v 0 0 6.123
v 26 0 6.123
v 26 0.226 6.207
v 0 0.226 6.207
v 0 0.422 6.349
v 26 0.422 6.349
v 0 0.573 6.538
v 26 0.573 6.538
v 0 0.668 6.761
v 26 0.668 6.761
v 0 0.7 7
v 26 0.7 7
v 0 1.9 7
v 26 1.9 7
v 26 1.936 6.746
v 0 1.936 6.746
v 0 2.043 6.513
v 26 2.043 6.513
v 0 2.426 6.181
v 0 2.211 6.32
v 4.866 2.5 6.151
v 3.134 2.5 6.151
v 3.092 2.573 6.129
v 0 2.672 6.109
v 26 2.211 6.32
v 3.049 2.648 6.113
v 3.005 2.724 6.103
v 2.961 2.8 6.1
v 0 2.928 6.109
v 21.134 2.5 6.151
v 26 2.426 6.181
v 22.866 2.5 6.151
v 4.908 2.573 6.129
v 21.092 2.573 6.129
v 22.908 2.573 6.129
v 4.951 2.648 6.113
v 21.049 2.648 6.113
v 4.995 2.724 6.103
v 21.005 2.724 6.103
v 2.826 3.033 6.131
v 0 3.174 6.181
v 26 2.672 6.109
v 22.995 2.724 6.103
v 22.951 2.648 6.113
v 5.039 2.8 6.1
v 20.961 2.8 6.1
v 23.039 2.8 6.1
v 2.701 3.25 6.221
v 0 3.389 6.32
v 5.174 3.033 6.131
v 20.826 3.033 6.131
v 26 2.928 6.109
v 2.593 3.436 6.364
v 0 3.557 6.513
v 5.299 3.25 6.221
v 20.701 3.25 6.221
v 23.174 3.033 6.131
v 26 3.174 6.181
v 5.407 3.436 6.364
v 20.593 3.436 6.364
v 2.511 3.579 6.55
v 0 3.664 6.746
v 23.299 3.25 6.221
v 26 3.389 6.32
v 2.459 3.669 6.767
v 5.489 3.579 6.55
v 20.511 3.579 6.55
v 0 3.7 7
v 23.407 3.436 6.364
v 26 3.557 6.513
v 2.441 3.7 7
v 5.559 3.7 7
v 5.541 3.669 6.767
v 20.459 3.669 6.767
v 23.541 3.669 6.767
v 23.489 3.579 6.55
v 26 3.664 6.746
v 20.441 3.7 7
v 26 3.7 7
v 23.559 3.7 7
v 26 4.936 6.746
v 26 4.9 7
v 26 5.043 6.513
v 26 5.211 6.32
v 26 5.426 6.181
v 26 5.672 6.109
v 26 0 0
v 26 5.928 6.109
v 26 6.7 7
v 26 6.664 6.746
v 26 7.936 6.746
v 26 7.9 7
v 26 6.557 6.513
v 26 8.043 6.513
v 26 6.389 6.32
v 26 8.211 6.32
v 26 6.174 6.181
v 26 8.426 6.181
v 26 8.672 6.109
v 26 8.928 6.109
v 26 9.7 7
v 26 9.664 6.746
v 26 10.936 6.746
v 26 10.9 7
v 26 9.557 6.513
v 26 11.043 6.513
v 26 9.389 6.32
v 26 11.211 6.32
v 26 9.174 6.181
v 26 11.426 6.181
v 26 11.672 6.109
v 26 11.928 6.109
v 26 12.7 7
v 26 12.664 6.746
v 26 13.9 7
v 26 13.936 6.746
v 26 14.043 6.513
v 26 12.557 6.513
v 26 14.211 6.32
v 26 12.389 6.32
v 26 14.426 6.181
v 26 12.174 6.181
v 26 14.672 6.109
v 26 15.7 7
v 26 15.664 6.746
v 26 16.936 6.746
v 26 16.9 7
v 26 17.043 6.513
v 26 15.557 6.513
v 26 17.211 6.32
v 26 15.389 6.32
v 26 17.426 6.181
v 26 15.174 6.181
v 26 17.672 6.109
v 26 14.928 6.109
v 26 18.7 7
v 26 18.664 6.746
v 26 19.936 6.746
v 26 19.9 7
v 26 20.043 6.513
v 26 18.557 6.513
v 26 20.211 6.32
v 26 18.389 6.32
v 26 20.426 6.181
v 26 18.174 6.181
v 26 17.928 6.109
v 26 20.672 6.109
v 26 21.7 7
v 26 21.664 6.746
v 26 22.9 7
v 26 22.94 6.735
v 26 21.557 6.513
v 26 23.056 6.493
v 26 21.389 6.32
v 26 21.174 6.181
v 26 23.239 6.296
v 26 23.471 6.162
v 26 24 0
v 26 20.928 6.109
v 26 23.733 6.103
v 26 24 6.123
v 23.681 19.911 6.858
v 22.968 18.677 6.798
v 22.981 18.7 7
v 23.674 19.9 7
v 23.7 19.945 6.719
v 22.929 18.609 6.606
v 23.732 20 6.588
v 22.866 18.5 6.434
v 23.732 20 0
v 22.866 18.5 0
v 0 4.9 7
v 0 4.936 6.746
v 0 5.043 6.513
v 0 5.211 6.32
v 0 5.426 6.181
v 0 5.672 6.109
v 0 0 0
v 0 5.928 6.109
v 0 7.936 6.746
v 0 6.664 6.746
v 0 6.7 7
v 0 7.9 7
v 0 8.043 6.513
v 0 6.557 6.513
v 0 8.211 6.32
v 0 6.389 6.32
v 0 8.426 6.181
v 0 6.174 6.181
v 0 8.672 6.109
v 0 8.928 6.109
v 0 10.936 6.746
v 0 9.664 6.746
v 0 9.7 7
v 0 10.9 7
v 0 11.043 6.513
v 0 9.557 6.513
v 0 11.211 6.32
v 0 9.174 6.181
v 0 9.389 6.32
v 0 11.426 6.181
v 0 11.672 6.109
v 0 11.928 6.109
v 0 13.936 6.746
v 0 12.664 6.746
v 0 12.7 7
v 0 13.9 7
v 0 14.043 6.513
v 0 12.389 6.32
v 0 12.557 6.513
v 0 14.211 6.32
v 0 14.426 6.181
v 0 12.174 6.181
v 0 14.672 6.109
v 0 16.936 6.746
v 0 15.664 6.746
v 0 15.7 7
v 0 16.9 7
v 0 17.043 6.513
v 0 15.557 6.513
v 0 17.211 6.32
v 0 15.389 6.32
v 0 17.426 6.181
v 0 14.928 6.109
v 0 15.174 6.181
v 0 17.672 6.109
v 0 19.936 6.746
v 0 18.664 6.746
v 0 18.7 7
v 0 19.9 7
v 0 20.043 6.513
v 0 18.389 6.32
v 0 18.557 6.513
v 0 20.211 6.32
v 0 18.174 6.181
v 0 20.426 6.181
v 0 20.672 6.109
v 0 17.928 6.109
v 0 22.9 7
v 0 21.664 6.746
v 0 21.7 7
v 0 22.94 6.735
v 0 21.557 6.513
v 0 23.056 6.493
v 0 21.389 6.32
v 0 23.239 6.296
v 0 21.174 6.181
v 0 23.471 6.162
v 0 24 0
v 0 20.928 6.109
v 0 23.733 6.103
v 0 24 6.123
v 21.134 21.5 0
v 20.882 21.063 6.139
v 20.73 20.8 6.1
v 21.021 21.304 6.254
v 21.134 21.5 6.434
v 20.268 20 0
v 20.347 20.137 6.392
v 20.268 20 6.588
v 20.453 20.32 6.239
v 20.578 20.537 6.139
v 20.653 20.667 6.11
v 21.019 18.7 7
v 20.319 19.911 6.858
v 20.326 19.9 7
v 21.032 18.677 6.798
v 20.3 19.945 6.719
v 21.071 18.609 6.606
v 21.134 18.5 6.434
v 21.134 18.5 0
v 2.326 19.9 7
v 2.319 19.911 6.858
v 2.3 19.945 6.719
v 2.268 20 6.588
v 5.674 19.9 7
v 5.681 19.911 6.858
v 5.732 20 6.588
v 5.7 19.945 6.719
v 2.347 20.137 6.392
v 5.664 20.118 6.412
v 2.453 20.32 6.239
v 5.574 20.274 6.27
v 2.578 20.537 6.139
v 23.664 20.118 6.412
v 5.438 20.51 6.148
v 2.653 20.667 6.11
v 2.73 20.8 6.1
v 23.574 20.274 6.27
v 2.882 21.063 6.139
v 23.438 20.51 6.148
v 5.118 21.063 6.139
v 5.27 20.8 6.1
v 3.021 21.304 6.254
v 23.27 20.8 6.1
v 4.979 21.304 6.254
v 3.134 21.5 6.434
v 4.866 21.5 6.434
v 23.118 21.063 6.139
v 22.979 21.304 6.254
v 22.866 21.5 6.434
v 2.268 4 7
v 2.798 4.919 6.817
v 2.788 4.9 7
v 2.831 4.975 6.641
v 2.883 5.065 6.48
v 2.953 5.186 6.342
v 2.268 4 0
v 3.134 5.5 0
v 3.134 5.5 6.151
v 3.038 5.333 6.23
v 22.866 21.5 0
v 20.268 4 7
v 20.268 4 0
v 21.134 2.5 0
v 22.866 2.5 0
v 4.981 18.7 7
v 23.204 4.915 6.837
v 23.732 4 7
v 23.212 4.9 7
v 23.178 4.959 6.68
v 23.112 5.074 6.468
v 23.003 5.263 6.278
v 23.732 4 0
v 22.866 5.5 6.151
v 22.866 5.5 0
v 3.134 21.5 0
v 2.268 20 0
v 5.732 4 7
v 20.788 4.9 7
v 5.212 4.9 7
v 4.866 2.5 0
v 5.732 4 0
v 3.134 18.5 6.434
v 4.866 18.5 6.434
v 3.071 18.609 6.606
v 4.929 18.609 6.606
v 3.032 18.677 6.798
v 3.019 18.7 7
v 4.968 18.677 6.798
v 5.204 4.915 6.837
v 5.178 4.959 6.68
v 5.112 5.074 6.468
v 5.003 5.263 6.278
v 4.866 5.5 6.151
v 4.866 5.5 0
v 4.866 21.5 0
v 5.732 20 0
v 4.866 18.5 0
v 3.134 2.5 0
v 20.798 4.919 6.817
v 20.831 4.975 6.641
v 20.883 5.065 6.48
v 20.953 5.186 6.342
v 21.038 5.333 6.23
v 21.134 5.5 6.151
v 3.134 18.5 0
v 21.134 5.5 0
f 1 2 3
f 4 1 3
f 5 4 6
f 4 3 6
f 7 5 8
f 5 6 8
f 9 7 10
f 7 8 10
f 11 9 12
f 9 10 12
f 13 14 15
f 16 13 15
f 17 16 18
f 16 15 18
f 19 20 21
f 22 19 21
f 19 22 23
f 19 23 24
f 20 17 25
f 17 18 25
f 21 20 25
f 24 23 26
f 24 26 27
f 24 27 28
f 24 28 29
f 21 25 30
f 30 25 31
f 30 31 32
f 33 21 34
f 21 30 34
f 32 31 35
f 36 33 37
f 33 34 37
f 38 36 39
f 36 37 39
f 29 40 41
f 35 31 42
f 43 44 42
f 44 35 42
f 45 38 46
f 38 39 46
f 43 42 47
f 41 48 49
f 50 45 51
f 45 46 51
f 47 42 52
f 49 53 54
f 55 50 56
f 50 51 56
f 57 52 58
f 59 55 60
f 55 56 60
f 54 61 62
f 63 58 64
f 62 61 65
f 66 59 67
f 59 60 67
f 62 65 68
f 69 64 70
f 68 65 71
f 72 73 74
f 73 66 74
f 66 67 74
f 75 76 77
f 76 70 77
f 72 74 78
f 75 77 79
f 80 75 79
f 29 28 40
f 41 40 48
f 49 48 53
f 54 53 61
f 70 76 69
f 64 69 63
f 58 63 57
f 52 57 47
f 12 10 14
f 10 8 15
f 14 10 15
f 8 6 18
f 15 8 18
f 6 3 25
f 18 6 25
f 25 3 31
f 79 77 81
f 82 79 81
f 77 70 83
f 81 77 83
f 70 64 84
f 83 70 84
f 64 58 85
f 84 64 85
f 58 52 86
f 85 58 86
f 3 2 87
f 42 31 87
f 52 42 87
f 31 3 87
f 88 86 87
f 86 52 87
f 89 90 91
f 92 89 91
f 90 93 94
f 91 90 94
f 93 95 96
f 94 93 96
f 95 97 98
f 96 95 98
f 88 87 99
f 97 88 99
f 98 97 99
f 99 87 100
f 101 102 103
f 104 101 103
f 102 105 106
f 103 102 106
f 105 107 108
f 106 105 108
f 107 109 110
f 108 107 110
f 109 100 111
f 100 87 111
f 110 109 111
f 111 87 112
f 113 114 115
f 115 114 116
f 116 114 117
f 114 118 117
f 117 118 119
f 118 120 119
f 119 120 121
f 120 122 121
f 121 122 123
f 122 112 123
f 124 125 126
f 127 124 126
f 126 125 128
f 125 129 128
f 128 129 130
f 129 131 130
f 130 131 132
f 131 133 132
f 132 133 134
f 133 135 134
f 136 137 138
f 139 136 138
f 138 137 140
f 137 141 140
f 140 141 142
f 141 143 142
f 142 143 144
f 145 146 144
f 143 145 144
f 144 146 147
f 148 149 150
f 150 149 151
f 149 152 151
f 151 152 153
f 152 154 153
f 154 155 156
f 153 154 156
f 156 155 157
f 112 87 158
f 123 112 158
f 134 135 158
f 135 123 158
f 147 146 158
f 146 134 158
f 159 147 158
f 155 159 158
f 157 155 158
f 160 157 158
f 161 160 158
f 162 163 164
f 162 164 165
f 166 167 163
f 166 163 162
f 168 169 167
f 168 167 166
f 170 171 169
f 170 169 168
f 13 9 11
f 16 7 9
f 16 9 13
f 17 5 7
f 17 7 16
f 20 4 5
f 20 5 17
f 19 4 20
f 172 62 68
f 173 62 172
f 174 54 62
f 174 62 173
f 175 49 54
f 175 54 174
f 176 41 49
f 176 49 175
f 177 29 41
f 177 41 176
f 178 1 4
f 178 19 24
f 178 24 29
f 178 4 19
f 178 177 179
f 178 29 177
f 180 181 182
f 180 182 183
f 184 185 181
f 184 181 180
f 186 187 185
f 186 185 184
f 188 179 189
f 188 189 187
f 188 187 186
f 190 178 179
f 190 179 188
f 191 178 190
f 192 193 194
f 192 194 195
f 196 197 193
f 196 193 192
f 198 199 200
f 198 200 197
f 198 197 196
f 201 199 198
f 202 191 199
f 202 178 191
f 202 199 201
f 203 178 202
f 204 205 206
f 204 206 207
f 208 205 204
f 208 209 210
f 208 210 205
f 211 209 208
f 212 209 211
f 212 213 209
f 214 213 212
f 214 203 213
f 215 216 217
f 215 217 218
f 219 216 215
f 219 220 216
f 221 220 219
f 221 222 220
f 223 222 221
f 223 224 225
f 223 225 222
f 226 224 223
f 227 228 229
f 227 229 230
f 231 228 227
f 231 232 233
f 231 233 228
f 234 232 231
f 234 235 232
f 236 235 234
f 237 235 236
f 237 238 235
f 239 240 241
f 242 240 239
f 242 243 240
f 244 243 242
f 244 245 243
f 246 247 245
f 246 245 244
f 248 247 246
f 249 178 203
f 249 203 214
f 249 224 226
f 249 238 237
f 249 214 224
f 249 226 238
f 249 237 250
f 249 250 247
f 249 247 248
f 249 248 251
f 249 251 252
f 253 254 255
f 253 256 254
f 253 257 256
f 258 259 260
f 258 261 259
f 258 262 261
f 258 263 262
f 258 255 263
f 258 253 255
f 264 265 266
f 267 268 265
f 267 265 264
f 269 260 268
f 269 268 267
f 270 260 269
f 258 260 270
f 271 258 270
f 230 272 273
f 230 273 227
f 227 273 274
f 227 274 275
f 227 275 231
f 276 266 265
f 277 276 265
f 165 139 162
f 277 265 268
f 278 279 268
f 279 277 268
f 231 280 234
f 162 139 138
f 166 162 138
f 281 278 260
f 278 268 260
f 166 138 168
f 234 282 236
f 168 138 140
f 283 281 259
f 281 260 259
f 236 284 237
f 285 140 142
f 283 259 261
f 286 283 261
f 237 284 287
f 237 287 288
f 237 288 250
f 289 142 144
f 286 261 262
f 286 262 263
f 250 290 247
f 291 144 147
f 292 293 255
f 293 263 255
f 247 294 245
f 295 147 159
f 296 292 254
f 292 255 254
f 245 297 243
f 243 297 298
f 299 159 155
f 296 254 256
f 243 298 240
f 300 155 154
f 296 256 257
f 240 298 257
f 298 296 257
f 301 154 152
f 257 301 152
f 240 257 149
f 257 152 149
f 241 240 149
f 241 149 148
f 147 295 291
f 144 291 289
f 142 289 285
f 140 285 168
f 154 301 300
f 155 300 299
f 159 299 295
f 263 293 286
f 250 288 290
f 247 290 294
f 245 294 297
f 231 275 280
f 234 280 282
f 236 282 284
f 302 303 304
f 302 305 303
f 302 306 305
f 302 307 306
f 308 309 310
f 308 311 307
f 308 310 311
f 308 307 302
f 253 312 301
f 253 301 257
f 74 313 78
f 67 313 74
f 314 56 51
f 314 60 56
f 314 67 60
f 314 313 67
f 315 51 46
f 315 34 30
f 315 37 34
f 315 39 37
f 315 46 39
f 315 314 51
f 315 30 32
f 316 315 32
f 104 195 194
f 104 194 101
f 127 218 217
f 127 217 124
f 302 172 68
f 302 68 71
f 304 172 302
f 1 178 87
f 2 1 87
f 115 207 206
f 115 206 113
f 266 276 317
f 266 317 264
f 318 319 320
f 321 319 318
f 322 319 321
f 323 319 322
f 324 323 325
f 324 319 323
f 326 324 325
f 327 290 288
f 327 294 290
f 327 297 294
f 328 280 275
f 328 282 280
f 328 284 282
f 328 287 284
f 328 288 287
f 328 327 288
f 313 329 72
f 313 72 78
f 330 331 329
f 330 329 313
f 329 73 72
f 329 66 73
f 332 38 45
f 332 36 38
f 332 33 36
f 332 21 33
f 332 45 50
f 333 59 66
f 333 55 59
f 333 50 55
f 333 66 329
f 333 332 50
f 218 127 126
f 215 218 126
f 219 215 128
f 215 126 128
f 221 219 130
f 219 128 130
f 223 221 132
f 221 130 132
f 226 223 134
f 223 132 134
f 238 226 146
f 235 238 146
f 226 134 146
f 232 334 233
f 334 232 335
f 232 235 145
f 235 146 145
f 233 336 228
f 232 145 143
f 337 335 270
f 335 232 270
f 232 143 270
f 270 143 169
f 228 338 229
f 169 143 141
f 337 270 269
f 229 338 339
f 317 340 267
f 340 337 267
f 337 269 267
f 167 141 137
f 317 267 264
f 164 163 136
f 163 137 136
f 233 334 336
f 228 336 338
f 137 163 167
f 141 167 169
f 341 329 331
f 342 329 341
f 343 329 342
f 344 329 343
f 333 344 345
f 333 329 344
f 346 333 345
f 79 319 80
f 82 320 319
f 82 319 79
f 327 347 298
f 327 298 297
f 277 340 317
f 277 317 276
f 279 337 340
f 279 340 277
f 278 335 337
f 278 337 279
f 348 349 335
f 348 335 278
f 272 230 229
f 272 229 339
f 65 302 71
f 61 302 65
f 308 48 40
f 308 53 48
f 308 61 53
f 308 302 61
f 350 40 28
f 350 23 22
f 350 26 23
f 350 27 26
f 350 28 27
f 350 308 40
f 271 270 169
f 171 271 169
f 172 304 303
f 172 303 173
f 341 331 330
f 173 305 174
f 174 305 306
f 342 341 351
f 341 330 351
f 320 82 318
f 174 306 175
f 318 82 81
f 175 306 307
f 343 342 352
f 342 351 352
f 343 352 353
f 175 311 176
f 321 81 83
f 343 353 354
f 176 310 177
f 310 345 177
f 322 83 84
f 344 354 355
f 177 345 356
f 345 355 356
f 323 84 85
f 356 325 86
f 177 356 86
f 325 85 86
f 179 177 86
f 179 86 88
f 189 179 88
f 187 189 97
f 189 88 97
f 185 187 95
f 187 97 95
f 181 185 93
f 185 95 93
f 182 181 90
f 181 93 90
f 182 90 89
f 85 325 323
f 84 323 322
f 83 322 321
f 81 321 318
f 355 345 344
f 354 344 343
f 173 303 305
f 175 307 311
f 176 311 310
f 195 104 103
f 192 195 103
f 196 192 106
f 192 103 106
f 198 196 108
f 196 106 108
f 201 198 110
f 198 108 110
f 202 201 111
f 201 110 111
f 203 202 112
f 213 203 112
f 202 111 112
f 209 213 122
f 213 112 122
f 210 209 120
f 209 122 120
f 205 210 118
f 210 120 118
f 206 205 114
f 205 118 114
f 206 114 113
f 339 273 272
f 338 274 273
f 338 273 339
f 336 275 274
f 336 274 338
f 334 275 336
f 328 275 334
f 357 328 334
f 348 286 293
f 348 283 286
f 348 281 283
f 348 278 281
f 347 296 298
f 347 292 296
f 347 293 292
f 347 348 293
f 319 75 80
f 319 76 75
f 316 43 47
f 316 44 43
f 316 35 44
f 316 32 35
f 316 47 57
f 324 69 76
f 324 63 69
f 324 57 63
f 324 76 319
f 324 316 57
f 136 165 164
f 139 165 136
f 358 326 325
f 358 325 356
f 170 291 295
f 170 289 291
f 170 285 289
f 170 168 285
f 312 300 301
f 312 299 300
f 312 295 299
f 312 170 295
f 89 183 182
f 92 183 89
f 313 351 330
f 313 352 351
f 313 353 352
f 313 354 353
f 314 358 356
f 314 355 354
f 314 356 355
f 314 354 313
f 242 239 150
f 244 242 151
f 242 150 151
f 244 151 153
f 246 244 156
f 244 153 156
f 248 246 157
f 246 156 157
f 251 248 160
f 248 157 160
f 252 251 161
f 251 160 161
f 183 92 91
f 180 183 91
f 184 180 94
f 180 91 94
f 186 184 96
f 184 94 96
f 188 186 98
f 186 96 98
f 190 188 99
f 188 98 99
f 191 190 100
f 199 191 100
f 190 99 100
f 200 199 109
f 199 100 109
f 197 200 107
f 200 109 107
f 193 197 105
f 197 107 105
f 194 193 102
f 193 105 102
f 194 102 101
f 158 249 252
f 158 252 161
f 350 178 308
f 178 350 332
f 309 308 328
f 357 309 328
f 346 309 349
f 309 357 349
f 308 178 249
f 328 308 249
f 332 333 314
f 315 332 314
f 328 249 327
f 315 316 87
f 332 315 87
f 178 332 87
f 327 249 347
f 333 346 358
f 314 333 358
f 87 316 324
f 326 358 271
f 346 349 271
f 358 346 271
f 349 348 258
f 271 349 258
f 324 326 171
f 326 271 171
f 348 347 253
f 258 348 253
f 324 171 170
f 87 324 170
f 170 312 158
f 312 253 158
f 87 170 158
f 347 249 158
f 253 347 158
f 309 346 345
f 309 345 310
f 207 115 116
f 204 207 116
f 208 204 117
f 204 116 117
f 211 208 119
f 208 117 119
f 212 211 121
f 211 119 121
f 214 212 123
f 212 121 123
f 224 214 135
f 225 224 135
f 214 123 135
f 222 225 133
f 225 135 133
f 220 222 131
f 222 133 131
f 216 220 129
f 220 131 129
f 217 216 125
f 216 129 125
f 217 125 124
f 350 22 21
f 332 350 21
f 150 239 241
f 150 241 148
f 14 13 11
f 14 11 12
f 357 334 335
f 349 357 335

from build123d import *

# Parameters (mm, degrees)
SKETCH3_W           = 26
SKETCH3_H           = 24
BOSS_EXTRUDE2_DEPTH = 7
SKETCH7_R           = 0.9
CUT_EXTRUDE1_DEPTH  = 27


with BuildPart() as part:
    # Sketch3 → Boss-Extrude2 (new body)
    with BuildSketch(Plane.XY):
        with Locations((13, 12)):
            Rectangle(SKETCH3_W, SKETCH3_H)
        Polygon((5.732050808, 4), (4.866025404, 5.5), (3.133974596, 5.5), (2.267949192, 4), (3.133974596, 2.5), (4.866025404, 2.5), align=None, mode=Mode.SUBTRACT)
        Polygon((5.732050808, 20), (4.866025404, 21.5), (3.133974596, 21.5), (2.267949192, 20), (3.133974596, 18.5), (4.866025404, 18.5), align=None, mode=Mode.SUBTRACT)
        Polygon((23.732050808, 20), (22.866025404, 21.5), (21.133974596, 21.5), (20.267949192, 20), (21.133974596, 18.5), (22.866025404, 18.5), align=None, mode=Mode.SUBTRACT)
        Polygon((23.732050808, 4), (22.866025404, 5.5), (21.133974596, 5.5), (20.267949192, 4), (21.133974596, 2.5), (22.866025404, 2.5), align=None, mode=Mode.SUBTRACT)
    extrude(amount=BOSS_EXTRUDE2_DEPTH)

    # Sketch7 → Cut-Extrude1 (cut, through all)
    with BuildSketch(Plane(origin=(26, 0, 0), x_dir=(0, 0, -1), z_dir=(1, 0, 0))):
        with Locations((-7, 23.8)):
            Circle(SKETCH7_R)
        with Locations((-7, 20.8)):
            Circle(SKETCH7_R)
        with Locations((-7, 17.8)):
            Circle(SKETCH7_R)
        with Locations((-7, 14.8)):
            Circle(SKETCH7_R)
        with Locations((-7, 11.8)):
            Circle(SKETCH7_R)
        with Locations((-7, 8.8)):
            Circle(SKETCH7_R)
        with Locations((-7, 5.8)):
            Circle(SKETCH7_R)
        with Locations((-7, 2.8)):
            Circle(SKETCH7_R)
        with Locations((-7, -0.2)):
            Circle(SKETCH7_R)
    extrude(amount=-CUT_EXTRUDE1_DEPTH, mode=Mode.SUBTRACT)


solid = part.part
